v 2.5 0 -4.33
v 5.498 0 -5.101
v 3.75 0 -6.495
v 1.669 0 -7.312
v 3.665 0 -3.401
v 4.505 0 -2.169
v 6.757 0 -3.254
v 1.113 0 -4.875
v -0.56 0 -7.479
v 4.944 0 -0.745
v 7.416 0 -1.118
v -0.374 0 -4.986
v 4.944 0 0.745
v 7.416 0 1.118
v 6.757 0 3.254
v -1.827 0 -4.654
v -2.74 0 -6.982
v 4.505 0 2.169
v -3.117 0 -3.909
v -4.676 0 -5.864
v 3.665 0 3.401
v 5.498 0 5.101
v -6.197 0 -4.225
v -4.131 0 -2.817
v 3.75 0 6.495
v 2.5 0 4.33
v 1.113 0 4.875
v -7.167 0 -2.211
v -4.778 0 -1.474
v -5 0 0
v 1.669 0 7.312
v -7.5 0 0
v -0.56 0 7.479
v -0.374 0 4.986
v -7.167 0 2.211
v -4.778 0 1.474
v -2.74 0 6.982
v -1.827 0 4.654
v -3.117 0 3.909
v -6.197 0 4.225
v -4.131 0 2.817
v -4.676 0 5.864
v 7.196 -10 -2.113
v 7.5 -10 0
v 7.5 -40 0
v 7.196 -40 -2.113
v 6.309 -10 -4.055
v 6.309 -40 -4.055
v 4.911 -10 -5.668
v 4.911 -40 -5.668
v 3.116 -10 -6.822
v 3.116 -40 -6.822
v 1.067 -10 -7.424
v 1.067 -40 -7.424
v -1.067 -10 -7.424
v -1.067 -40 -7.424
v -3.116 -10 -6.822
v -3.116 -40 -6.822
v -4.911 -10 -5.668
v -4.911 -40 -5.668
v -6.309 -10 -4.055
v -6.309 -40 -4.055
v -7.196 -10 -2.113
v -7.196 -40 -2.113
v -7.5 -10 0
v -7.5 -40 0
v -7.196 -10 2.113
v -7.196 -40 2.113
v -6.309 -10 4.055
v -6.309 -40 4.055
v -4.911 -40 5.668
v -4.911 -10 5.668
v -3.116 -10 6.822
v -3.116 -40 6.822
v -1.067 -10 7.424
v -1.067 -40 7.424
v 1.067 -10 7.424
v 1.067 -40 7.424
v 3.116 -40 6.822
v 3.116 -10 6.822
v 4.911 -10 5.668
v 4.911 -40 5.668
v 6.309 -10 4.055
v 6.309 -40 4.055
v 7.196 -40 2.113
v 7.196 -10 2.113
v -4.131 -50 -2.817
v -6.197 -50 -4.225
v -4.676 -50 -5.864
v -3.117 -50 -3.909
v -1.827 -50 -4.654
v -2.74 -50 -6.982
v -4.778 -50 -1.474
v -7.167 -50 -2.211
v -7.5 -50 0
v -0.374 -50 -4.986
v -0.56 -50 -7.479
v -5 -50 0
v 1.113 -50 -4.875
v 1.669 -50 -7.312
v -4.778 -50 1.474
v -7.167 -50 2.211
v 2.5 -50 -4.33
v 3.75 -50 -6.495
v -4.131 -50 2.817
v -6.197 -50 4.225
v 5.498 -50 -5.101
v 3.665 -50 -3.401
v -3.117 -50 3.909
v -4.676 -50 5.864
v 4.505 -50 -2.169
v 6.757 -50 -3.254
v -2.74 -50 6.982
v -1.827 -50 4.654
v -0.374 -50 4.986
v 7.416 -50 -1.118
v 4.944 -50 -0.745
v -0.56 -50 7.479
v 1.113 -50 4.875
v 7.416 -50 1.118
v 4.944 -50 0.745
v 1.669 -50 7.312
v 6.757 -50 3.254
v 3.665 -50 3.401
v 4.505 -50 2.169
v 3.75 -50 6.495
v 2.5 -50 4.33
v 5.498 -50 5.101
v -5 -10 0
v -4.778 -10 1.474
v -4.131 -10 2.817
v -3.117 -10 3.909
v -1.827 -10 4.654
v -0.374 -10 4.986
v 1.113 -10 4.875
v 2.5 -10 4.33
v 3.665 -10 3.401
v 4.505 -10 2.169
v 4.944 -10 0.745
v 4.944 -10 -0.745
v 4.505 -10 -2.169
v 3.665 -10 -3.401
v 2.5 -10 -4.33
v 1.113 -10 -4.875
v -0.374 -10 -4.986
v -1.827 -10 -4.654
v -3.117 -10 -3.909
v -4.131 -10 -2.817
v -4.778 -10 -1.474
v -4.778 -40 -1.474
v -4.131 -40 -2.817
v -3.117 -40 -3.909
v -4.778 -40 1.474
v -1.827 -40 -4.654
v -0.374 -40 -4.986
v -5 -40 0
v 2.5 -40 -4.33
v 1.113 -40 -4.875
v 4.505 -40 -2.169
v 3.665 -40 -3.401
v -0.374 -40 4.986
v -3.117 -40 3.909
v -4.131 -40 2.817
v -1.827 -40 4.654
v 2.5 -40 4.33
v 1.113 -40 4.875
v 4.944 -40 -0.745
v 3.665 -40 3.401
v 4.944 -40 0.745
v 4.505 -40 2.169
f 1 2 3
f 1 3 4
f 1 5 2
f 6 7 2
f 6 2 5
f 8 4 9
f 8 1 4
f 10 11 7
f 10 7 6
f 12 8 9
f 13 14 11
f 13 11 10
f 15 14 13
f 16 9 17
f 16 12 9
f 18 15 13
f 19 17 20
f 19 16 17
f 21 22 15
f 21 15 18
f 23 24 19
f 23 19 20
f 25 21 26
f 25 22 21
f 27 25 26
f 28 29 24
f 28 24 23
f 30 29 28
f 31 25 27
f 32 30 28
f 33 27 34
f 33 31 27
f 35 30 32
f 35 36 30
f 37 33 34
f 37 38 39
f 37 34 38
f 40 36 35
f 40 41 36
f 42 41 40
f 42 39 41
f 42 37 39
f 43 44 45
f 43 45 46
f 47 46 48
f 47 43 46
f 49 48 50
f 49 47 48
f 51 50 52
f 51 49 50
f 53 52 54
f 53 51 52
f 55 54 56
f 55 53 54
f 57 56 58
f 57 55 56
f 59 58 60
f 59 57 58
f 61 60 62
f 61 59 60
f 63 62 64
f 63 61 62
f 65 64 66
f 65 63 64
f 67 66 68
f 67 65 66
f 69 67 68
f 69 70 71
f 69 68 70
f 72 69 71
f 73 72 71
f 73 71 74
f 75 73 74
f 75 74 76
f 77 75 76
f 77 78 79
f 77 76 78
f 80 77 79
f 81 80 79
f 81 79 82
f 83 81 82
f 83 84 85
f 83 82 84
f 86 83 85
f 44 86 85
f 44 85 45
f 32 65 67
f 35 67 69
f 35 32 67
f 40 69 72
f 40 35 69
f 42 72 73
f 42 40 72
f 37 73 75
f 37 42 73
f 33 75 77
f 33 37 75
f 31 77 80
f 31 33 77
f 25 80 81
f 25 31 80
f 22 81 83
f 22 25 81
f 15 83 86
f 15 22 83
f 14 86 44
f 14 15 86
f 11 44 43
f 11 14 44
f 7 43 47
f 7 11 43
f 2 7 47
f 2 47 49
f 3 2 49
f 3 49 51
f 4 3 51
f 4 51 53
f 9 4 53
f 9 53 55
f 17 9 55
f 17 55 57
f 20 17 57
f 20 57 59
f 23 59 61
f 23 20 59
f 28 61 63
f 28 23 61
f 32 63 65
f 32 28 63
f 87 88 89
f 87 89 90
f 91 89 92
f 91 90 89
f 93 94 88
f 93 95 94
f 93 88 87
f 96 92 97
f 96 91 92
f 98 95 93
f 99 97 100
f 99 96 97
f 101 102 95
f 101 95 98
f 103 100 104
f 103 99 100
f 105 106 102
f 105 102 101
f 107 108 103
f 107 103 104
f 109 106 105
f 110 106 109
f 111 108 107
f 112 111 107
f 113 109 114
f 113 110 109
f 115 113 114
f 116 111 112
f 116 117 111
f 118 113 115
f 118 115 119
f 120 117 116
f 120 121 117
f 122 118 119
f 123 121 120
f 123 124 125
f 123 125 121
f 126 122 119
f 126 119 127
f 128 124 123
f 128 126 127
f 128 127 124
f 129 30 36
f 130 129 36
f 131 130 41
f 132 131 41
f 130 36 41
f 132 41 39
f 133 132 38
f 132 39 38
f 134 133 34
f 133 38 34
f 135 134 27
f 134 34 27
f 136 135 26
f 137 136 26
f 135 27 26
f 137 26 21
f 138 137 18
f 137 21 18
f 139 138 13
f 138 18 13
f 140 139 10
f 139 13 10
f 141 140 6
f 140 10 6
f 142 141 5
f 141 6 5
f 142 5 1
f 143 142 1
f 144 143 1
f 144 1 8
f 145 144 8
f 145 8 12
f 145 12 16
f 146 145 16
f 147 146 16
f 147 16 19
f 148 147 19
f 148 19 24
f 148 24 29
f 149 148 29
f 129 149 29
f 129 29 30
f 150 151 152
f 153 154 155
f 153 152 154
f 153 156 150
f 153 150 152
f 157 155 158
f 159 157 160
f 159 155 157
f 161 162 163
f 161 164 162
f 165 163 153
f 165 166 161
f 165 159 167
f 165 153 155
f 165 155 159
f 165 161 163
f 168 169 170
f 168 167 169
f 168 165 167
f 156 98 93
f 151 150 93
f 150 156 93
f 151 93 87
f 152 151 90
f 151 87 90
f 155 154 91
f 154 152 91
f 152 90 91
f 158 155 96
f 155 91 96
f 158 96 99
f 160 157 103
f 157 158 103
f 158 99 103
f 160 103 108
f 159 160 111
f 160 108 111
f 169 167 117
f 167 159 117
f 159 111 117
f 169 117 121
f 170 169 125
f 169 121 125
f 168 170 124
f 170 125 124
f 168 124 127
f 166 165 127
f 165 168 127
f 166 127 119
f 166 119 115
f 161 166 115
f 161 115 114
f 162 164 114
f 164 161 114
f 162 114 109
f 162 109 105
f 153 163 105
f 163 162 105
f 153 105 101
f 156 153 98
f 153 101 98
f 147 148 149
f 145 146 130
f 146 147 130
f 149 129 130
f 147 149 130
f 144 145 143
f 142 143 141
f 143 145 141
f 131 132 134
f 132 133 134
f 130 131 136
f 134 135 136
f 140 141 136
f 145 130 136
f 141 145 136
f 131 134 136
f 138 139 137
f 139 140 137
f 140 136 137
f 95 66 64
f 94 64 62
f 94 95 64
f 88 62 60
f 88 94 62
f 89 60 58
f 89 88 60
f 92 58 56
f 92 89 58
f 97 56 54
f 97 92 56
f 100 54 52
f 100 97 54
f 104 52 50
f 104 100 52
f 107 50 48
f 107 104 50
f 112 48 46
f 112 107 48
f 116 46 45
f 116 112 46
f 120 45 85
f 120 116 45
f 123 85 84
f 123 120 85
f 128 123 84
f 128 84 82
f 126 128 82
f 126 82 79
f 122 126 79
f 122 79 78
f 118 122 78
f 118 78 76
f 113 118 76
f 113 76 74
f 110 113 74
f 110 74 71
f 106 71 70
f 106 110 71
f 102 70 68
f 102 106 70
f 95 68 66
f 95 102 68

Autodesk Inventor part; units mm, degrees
ref_plane "YZ Plane" through (0, 0, 0) normal (1, 0, 0) x (0, 1, 0)
ref_plane "XZ Plane" through (0, 0, 0) normal (0, 1, 0) x (-1, 0, 0)
ref_plane "XY Plane" through (0, 0, 0) normal (0, 0, 1) x (1, 0, 0)
sketch "Sketch1" plane through (0, 0, 0) normal (0, 1, 0) x (-1, 0, 0)
  circle A0 centre (0, 0) radius 3.5 construction
  circle A1 centre (0, 0) radius 5
  circle A2 centre (0, 0) radius 7.5
  dimension "d0" = 7
  dimension "d1" = 10
  dimension "d2" = 15
extrude "Extrusion1" add sketch "Sketch1" against normal blind 10
sketch "Sketch2" plane through (0, -10, 0) normal (0, -1, 0) x (1, 0, 0)
  circle A0 centre (0, 0) radius 7.5
extrude "Extrusion2" add sketch "Sketch2" along normal blind 30
ref_plane "Work Plane2" through (0, -25, 0) normal (0, -1, 0) x (1, 0, 0)
mirror "Mirror1" about plane through (0, -25, 0) normal (0, -1, 0) of "Extrusion1"
properties part number "PataPolimero"
